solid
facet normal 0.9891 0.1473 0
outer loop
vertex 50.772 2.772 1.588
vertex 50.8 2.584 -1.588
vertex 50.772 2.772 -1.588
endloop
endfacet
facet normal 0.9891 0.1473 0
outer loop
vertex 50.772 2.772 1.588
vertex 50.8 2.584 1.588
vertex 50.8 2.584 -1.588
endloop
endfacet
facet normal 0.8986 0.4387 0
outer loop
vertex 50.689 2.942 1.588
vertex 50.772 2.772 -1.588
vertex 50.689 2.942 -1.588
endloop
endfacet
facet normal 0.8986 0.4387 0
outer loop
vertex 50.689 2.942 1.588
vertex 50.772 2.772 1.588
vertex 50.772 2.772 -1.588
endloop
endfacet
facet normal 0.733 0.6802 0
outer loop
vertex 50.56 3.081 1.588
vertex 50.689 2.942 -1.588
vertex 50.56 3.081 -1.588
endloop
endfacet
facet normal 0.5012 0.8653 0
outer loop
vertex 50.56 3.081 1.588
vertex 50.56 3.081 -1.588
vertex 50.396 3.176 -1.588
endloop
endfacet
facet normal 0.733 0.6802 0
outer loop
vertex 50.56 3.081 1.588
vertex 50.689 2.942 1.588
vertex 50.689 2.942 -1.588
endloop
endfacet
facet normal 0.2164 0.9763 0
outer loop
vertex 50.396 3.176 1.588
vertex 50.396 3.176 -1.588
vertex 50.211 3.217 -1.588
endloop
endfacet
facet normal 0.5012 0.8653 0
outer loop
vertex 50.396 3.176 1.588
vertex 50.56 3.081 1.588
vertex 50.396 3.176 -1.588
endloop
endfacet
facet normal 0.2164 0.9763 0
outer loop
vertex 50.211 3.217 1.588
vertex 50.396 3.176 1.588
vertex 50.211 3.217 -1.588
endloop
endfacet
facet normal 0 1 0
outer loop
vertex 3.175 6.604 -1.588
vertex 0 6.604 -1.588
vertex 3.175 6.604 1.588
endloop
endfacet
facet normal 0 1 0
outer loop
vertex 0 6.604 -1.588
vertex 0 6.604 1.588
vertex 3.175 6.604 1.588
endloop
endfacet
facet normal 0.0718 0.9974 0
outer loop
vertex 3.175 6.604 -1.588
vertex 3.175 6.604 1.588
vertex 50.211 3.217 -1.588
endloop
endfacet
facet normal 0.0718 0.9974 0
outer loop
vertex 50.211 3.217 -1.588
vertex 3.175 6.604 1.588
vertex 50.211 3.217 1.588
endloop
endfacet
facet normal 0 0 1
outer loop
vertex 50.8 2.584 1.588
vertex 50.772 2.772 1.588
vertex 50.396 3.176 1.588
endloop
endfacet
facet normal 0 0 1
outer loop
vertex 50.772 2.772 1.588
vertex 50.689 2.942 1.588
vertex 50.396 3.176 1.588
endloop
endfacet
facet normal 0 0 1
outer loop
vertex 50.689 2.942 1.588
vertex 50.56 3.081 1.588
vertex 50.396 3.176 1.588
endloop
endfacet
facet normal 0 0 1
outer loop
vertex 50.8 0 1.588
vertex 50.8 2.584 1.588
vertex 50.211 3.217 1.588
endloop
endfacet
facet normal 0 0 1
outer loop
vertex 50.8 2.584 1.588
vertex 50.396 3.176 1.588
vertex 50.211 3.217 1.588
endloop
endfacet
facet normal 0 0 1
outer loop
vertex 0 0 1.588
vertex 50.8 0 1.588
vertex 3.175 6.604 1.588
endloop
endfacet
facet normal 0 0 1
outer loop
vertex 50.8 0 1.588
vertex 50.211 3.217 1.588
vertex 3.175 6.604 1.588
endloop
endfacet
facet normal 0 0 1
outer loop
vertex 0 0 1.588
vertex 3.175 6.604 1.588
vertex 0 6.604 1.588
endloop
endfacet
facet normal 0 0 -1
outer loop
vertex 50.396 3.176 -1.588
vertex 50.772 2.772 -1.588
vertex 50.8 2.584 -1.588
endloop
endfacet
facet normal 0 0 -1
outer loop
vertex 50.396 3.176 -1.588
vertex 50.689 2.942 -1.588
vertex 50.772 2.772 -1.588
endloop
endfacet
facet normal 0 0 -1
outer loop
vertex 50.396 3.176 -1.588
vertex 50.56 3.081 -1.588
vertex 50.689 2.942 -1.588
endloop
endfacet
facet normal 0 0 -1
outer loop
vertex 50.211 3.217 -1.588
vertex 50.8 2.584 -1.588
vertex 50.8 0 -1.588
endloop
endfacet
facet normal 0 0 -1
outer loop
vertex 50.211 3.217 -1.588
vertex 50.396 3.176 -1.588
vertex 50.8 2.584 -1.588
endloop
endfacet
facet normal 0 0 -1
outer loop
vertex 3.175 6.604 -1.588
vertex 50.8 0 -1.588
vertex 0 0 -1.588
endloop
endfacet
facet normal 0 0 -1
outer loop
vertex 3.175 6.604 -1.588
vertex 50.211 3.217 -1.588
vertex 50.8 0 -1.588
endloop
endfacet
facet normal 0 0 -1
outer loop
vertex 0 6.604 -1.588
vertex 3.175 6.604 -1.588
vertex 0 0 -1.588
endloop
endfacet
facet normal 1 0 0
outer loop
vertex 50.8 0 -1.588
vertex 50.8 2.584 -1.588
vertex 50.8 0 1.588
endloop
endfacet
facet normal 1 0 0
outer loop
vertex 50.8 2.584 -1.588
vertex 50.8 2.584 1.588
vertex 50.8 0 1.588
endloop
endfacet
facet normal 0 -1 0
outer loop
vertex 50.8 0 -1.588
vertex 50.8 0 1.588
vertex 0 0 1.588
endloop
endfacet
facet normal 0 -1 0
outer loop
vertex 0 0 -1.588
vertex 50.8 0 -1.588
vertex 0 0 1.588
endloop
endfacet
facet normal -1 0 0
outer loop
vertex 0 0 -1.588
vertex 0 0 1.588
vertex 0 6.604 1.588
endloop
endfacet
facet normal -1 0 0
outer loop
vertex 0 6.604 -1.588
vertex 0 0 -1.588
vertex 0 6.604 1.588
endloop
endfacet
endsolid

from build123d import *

# Parameters (mm, degrees)
BOSS_EXTRUDE1_DEPTH = 1.5875
FILLET1_R           = 0.635


with BuildPart() as part:
    # Sketch1 → Boss-Extrude1 (new, symmetric)
    with BuildSketch(Plane.XY):
        Polygon((0, 0), (0, 6.604), (3.175, 6.604), (50.8, 3.175), (50.8, 0), align=None)
    extrude(amount=BOSS_EXTRUDE1_DEPTH, both=True)

    # Fillet1
    fillet1_edges = [part.edges().sort_by_distance(p)[0] for p in [
        (50.8, 3.175, 0),
    ]]
    fillet(fillet1_edges, radius=FILLET1_R)


solid = part.part
